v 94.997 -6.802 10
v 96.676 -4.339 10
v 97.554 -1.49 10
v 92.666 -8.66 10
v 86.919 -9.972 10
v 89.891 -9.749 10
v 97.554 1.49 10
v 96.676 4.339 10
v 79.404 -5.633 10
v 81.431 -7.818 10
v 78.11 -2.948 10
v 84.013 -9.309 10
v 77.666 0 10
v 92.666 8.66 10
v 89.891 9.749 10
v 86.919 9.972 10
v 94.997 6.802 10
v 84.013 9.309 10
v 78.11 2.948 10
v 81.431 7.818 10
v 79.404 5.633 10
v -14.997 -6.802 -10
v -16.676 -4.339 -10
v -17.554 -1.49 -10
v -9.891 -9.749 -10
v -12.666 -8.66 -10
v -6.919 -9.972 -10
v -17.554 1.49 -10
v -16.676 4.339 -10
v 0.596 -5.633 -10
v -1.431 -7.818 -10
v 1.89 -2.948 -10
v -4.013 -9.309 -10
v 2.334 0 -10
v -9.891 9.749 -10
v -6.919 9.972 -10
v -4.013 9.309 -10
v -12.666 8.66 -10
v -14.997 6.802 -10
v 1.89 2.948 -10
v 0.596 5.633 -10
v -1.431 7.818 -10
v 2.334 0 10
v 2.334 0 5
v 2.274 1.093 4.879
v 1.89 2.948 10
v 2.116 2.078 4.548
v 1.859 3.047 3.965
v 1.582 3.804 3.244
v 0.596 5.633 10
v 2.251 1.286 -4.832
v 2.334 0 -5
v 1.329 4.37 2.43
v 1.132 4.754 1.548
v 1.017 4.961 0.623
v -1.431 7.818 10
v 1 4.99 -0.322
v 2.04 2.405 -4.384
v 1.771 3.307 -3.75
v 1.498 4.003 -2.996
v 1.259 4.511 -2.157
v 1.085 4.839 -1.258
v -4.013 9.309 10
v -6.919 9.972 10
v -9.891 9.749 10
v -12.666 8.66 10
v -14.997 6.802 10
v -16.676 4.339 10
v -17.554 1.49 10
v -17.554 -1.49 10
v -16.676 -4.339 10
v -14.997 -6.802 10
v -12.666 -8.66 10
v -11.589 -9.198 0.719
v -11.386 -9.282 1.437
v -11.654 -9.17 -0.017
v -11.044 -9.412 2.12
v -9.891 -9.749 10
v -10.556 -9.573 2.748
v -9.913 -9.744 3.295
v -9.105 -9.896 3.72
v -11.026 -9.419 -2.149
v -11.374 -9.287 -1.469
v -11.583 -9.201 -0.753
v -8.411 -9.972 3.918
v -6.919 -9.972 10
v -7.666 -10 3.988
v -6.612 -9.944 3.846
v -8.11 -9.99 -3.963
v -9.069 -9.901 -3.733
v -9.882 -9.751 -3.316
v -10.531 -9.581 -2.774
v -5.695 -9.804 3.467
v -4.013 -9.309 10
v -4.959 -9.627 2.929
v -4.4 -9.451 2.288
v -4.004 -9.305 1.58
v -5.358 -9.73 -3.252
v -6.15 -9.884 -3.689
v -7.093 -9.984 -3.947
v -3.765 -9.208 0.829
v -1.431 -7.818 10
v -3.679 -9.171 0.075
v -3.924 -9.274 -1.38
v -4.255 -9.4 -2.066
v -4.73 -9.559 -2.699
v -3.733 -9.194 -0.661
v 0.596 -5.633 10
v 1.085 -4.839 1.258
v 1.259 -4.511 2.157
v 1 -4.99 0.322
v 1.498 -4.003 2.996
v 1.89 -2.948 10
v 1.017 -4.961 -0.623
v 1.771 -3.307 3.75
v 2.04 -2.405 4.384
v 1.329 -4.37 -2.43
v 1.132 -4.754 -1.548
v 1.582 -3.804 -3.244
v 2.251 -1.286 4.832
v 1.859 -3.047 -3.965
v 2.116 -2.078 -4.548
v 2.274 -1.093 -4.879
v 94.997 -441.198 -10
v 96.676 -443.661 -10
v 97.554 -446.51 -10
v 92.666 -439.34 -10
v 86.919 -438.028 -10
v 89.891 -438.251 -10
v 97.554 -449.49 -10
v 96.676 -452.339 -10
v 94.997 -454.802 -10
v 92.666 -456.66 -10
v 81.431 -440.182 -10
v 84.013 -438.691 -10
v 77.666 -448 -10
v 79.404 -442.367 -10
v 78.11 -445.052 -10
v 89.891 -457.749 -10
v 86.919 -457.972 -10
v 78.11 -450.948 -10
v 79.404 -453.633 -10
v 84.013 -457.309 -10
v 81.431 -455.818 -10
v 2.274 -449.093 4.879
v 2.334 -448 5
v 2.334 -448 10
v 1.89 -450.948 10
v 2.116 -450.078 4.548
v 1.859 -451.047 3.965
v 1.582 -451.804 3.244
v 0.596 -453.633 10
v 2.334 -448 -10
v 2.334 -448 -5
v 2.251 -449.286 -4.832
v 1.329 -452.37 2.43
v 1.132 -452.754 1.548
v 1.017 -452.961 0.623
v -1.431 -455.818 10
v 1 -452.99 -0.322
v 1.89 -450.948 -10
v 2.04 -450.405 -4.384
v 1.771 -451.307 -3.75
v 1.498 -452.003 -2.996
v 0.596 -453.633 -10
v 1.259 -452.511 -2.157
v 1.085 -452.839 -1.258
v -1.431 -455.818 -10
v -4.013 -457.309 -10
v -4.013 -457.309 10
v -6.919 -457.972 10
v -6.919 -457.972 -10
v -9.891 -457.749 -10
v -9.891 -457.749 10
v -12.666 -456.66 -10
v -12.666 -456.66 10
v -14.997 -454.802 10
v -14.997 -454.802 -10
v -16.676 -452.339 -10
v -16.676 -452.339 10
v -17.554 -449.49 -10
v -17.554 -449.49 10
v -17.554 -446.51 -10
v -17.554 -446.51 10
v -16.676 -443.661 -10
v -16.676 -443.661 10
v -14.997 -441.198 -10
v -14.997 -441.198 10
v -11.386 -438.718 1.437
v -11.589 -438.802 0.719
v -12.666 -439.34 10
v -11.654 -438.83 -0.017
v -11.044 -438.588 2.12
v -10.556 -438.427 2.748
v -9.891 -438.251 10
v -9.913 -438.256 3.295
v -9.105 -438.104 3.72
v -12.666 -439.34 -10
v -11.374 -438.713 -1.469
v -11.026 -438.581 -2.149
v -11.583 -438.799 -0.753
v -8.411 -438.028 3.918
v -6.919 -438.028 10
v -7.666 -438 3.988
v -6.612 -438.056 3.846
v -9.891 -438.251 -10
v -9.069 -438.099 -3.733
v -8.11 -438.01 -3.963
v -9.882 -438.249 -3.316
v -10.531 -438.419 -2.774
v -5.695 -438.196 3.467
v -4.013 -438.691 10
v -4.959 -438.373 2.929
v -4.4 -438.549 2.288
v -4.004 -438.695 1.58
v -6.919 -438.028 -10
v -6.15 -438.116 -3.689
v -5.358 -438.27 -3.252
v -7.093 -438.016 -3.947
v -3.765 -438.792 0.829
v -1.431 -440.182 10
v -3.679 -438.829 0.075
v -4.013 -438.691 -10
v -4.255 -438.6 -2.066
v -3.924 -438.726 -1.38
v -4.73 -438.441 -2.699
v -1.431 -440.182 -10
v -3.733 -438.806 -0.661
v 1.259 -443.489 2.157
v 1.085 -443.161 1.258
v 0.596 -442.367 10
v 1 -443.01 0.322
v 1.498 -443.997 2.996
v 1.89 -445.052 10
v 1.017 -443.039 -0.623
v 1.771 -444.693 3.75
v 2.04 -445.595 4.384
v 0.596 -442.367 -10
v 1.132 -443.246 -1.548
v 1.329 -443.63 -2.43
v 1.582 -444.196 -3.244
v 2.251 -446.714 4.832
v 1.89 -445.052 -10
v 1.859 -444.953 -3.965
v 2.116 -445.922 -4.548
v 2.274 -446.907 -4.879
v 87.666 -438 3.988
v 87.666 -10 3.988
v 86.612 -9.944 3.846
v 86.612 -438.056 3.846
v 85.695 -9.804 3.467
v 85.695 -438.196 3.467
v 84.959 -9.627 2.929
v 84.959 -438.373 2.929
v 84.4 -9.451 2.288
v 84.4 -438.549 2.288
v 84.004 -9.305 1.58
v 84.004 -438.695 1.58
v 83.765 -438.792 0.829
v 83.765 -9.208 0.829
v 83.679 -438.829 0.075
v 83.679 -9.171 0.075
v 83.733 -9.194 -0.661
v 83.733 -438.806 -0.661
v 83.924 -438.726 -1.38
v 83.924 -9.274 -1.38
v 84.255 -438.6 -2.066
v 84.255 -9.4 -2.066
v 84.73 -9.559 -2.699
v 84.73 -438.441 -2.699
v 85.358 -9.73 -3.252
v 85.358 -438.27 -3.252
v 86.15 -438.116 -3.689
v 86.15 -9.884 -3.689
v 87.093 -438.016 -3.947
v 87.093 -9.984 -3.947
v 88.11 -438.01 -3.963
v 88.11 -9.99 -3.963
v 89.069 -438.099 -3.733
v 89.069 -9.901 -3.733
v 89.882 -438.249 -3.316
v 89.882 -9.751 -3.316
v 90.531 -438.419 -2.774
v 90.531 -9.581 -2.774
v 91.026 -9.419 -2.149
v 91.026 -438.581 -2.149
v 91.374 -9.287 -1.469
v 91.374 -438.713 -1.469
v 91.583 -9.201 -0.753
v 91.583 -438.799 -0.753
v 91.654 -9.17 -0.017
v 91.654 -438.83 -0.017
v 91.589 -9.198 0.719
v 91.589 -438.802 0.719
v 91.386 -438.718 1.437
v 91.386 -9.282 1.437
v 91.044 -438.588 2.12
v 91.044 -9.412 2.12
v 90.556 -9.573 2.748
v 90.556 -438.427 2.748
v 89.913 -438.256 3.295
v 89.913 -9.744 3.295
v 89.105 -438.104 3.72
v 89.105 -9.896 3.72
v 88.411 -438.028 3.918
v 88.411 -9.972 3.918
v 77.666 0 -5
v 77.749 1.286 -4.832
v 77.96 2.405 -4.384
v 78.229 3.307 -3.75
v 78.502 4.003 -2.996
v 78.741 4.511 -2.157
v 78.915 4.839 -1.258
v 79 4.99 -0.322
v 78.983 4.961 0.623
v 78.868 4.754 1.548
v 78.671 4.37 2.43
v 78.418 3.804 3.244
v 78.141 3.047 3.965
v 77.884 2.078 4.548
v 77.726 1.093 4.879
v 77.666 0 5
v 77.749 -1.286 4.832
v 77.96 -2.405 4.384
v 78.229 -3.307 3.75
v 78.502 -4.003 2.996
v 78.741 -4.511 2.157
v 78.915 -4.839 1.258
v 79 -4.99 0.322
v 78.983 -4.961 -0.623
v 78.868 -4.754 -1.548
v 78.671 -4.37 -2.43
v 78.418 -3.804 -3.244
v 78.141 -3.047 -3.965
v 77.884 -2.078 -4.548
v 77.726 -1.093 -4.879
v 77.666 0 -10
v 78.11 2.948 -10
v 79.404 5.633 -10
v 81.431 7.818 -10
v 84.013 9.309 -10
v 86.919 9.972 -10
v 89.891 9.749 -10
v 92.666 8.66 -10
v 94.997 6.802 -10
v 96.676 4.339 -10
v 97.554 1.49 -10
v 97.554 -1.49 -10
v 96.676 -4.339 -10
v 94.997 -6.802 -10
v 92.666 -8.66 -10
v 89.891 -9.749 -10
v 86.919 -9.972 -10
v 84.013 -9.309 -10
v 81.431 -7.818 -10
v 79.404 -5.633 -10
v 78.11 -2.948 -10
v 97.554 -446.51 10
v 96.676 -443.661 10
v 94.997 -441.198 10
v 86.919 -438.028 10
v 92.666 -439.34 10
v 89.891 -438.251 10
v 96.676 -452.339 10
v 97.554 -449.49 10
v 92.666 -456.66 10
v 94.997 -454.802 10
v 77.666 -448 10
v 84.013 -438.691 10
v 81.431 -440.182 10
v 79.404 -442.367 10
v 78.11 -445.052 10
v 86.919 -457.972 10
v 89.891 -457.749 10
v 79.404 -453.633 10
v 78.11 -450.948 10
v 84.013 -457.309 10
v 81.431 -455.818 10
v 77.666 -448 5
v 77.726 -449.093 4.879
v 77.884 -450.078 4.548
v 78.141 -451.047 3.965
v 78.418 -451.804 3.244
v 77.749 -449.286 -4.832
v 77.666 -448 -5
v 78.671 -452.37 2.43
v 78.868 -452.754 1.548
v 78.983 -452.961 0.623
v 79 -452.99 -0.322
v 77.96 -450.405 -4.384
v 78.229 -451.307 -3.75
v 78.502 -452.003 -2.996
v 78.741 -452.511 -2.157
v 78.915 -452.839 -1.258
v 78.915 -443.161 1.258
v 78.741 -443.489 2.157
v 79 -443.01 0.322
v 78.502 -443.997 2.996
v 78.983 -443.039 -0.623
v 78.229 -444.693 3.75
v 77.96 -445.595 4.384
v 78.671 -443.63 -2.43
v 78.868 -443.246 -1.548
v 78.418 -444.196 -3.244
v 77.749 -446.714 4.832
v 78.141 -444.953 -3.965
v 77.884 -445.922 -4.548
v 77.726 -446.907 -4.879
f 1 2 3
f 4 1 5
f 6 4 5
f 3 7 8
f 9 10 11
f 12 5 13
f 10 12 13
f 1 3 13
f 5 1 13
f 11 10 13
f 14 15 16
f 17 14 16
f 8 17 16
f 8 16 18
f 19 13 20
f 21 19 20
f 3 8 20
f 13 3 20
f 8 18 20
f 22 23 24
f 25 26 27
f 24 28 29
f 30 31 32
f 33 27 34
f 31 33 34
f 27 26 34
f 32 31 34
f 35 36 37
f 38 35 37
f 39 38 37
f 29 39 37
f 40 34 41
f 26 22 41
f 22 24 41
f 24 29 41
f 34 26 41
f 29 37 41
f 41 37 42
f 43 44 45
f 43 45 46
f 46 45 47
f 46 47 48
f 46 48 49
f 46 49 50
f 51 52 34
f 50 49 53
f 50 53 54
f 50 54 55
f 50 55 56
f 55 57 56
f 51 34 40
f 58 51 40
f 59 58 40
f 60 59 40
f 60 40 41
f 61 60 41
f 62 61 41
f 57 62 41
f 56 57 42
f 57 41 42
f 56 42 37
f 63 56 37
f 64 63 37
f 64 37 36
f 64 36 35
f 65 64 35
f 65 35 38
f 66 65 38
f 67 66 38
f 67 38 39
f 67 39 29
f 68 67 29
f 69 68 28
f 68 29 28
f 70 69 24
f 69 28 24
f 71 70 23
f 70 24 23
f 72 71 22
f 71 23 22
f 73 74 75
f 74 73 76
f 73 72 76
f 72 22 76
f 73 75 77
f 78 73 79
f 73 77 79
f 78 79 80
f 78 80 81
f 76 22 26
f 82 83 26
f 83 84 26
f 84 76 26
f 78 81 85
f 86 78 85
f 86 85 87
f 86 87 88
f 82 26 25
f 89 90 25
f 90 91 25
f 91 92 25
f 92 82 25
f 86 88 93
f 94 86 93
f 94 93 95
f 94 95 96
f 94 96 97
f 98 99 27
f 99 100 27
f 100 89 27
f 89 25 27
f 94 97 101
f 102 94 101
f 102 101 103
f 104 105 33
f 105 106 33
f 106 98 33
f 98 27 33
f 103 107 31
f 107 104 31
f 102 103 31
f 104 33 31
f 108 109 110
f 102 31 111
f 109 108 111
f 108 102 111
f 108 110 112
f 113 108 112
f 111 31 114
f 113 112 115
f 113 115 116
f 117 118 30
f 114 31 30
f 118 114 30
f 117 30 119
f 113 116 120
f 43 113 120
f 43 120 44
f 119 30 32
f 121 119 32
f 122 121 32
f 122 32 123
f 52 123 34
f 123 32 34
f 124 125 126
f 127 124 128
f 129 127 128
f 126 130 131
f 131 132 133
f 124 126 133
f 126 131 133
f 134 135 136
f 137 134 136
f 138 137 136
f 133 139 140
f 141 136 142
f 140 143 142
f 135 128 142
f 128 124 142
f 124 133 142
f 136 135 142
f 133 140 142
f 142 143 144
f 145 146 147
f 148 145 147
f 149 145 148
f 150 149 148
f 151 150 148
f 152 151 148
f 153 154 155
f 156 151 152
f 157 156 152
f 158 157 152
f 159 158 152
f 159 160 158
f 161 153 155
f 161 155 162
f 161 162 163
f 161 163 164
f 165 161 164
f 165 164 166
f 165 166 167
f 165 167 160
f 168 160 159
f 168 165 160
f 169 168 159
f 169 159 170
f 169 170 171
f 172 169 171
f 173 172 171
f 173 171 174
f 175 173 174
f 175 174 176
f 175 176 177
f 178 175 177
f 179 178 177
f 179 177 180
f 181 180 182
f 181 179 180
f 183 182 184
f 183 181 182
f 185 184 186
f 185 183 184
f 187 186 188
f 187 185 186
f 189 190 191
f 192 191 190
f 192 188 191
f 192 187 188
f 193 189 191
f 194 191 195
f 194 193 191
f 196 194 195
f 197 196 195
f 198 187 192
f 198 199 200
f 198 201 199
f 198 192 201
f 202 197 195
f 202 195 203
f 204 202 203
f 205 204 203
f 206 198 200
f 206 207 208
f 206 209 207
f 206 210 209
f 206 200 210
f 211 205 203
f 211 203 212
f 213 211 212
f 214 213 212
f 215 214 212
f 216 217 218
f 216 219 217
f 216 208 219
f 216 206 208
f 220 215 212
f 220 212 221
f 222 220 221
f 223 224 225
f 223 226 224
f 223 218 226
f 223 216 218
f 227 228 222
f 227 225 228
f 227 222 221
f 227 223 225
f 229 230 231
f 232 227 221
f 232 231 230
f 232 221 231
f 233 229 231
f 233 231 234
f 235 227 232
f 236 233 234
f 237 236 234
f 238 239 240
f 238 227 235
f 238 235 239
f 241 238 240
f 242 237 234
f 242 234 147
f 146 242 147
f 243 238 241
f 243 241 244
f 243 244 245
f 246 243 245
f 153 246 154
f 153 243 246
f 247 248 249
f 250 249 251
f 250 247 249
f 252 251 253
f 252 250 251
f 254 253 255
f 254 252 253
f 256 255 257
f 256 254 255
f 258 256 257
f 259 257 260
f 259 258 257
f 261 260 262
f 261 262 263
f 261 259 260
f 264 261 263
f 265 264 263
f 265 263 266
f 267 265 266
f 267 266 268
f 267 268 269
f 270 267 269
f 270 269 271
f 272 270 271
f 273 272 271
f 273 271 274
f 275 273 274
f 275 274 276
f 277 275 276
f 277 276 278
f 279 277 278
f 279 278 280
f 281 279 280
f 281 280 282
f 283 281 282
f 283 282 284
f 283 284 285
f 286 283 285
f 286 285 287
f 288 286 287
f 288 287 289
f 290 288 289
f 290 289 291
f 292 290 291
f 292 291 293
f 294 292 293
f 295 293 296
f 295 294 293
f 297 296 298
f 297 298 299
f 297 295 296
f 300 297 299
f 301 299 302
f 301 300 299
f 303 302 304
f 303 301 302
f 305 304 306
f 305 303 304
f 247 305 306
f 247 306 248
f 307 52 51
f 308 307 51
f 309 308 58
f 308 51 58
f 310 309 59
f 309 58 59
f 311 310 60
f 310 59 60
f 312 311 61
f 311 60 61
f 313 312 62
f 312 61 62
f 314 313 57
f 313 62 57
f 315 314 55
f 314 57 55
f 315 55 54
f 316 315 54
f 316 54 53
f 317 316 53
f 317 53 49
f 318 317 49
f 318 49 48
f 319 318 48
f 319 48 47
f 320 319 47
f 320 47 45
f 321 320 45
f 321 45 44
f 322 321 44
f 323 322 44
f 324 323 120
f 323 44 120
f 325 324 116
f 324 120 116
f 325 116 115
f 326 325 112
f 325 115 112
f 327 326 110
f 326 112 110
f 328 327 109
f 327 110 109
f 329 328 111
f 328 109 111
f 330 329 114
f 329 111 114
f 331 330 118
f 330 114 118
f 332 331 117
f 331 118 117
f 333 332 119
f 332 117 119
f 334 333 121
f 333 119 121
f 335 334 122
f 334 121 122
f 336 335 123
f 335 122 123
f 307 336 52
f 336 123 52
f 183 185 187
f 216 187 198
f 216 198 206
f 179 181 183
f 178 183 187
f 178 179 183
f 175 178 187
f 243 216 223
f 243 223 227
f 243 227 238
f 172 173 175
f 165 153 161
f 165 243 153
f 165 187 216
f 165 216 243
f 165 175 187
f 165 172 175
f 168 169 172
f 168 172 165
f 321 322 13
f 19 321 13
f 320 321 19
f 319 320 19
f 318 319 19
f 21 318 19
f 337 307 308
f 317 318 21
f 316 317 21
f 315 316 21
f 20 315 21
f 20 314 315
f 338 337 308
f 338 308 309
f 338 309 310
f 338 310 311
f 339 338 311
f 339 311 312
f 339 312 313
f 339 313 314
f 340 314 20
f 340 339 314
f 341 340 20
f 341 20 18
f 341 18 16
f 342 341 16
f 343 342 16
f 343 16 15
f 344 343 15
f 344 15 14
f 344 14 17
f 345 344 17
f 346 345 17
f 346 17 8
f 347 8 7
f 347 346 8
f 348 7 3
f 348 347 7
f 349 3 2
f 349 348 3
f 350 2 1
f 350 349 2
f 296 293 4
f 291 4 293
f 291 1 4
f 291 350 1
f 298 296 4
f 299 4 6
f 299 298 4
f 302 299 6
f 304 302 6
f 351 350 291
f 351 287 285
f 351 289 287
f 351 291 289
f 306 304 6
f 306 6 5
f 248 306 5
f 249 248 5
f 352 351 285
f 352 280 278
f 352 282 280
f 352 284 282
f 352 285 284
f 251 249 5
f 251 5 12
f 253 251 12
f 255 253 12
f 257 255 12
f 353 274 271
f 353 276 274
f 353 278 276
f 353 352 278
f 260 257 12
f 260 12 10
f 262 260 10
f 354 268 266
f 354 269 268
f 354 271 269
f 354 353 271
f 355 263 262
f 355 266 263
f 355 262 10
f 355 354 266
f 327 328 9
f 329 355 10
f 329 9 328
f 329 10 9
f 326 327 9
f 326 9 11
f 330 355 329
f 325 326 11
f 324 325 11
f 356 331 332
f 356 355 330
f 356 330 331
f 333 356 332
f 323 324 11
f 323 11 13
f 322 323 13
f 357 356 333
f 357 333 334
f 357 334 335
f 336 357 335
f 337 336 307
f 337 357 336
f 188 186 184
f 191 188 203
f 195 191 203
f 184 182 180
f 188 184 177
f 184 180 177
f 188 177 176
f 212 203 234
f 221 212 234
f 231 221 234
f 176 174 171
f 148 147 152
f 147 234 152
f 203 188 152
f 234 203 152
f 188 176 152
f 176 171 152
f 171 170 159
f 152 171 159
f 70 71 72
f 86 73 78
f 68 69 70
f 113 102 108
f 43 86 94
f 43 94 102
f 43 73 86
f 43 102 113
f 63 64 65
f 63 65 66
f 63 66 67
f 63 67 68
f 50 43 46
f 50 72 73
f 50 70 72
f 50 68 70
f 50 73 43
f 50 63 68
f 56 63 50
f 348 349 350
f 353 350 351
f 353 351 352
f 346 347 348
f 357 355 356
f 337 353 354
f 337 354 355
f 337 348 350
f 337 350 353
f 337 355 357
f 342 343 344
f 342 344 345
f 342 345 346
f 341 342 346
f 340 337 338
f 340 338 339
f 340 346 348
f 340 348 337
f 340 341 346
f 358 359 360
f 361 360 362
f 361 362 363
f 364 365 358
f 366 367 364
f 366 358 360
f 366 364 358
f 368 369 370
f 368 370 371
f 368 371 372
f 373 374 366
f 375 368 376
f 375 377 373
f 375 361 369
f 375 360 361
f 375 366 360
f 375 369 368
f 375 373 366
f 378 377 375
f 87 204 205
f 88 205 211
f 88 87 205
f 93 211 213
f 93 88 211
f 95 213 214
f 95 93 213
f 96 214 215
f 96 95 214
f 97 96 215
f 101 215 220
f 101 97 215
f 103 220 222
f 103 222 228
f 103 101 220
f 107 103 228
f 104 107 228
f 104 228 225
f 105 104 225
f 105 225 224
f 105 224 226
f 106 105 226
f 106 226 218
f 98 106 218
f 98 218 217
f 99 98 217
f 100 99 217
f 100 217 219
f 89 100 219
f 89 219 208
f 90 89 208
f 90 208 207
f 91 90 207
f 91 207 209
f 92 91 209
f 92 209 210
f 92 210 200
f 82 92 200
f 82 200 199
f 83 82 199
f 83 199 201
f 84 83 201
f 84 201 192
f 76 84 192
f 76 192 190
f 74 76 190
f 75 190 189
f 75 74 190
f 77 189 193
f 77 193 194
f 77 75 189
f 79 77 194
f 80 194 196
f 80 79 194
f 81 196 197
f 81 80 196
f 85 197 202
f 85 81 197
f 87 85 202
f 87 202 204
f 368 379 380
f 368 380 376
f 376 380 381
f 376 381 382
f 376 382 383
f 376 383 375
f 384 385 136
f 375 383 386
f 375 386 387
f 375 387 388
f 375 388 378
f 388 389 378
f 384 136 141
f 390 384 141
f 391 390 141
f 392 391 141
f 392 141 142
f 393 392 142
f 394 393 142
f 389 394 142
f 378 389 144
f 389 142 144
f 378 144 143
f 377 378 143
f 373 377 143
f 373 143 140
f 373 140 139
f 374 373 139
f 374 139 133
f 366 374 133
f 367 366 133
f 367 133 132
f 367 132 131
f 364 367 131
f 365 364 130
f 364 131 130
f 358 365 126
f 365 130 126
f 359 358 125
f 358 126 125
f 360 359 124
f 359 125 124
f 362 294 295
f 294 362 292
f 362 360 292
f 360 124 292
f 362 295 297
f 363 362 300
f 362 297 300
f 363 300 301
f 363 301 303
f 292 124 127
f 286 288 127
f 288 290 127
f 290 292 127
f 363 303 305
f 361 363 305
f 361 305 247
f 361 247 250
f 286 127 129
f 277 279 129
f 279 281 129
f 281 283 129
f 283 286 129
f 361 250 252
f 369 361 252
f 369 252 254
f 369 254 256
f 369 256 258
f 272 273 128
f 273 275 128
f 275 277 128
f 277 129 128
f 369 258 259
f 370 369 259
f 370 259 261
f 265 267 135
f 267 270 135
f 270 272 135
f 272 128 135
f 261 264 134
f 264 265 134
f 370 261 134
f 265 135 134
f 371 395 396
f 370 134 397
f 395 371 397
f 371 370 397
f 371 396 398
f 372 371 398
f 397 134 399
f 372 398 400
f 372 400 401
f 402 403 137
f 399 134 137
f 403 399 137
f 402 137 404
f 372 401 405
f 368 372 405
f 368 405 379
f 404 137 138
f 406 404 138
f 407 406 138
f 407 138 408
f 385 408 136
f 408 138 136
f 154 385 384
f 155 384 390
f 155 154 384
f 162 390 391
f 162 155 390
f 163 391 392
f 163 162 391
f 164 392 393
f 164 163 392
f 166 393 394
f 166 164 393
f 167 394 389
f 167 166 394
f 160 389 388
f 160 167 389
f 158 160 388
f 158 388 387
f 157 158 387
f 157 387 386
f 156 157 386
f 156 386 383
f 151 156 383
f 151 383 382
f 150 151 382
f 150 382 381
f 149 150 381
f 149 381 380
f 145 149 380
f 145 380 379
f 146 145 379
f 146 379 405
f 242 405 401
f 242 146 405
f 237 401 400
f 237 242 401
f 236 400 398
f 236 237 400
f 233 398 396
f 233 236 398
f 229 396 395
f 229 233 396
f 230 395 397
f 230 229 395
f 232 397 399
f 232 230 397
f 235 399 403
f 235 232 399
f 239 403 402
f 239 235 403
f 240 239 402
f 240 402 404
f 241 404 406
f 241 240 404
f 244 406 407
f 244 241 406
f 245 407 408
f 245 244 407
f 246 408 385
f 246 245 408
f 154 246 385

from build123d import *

# Parameters (mm, degrees)
SKETCH1_R                = 5
BOSS_EXTRUDE1_DEPTH      = 80
BOSS_EXTRUDE2_DEPTH      = 10
BOSS_EXTRUDE2_DEPTH_BACK = 10
SKETCH2_R                = 10
SKETCH3_R                = 3.98820793
BOSS_EXTRUDE3_DEPTH      = 448


with BuildPart() as part:
    # Sketch1 → Boss-Extrude1 (new body)
    with BuildSketch(Plane(origin=(0, 0, 0), x_dir=(0, 0, -1), z_dir=(1, 0, 0))):
        Circle(SKETCH1_R)
    extrude(amount=BOSS_EXTRUDE1_DEPTH)


with BuildPart() as body_2:
    # Sketch2 → Boss-Extrude2 (new, two sides: drawn at the far end of the back side and taken through both)
    with BuildSketch(Plane.XY.offset(-BOSS_EXTRUDE2_DEPTH_BACK)):
        with Locations((-7.666034923, 0)):
            Circle(SKETCH2_R)
    extrude(amount=BOSS_EXTRUDE2_DEPTH + BOSS_EXTRUDE2_DEPTH_BACK)

    # Sketch3 → Boss-Extrude3 (add)
    with BuildSketch(Plane(origin=(0, 0, 0), x_dir=(1, 0, 0), z_dir=(0, 1, 0))):
        with Locations((-7.666034923, 0)):
            Circle(SKETCH3_R)
    extrude(amount=-BOSS_EXTRUDE3_DEPTH)


with BuildPart() as body_3:
    # Mirror1: mirrored copy
    add(part.part.mirror(Plane.ZX.offset(-224)))


with BuildPart() as body_4:
    # Mirror1 2: mirrored copy
    add(body_2.part.mirror(Plane.ZX.offset(-224)))


with BuildPart() as body_5:
    # Mirror2: mirrored copy
    add(part.part.mirror(Plane.ZY.offset(-40)))


with BuildPart() as body_6:
    # Mirror2 2: mirrored copy
    add(body_3.part.mirror(Plane.ZY.offset(-40)))


with BuildPart() as body_7:
    # Mirror2 3: mirrored copy
    add(body_4.part.mirror(Plane.ZY.offset(-40)))


with BuildPart() as body_8:
    # Mirror2 4: mirrored copy
    add(body_2.part.mirror(Plane.ZY.offset(-40)))


with BuildPart() as body_7_1:
    add(body_7.part)

    # Combine1: union part, body 8, body 5, body 2, body 3, body 6, body 4
    add(part.part)
    add(body_8.part)
    add(body_5.part)
    add(body_2.part)
    add(body_3.part)
    add(body_6.part)
    add(body_4.part)


solid = body_7_1.part
